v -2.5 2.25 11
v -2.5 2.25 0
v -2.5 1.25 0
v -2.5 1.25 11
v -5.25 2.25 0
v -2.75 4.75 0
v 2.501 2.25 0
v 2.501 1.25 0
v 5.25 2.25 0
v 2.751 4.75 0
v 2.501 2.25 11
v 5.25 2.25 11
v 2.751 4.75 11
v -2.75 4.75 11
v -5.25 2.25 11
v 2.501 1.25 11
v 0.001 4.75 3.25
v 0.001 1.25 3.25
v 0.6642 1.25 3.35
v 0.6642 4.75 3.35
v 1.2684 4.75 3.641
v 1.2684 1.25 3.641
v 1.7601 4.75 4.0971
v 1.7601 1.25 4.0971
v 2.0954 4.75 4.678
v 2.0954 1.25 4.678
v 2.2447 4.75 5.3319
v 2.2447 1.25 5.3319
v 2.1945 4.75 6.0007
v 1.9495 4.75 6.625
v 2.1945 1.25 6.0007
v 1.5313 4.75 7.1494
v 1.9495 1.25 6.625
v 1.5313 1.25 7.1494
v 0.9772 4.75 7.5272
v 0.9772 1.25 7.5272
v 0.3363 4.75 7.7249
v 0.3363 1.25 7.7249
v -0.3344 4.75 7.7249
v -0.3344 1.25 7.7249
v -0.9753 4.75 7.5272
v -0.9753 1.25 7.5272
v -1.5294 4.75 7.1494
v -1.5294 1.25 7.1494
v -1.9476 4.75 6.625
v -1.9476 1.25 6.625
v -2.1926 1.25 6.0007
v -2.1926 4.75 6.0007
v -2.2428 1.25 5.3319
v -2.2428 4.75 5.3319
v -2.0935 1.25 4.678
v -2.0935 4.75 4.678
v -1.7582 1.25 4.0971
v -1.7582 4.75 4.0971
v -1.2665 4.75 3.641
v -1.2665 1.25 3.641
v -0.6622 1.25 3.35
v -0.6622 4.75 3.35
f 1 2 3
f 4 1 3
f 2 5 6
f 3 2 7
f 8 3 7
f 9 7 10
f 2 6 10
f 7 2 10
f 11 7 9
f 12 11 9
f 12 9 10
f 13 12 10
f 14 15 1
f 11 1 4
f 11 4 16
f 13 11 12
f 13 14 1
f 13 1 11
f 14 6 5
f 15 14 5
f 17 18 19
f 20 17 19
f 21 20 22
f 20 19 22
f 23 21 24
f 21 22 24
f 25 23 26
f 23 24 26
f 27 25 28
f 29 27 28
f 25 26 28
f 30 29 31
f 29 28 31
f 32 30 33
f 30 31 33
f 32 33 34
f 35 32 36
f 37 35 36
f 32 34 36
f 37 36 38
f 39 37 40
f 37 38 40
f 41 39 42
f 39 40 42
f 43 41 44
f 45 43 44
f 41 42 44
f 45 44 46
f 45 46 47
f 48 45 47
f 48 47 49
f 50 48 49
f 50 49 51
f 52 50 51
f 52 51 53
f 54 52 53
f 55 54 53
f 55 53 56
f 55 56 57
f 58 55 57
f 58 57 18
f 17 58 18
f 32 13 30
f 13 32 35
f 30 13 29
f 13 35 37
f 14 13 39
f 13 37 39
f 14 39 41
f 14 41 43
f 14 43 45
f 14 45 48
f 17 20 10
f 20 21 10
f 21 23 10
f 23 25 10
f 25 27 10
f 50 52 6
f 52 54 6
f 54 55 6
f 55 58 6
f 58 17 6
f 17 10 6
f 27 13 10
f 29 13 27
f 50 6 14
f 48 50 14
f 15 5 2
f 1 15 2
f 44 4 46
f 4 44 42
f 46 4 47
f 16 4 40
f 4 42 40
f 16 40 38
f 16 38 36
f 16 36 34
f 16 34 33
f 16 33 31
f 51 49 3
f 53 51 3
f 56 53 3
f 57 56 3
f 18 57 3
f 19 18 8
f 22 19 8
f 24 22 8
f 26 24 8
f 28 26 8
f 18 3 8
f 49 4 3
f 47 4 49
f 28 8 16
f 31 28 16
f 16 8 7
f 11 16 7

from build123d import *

# Parameters (mm, degrees)
BOSS_EXTRU_1_DEPTH      = 11
ESQUISSE2_R             = 2.25
ENL_V_MAT_EXTRU_1_DEPTH = 13.681186853


with BuildPart() as part:
    # Esquisse1 → Boss.-Extru.1 (new body)
    with BuildSketch(Plane.XY):
        Polygon((2.500951888, 4.75), (-2.5, 4.75), (-2.75, 4.75), (-5.25, 2.25), (-4.5, 2.25), (-2.5, 2.25), (-2.5, 1.25), (2.500951888, 1.25), (2.500951888, 2.25), (4.5, 2.25), (5.25, 2.25), (2.750951888, 4.75), align=None)
    extrude(amount=BOSS_EXTRU_1_DEPTH)

    # Esquisse2 → Enlèv. mat.-Extru.1 (cut, through all)
    with BuildSketch(Plane.XZ.offset(-1.25)):
        with Locations(Location((0.000951888, 5.5, 0), (0, 0, 270))):
            Circle(ESQUISSE2_R)
    extrude(amount=-ENL_V_MAT_EXTRU_1_DEPTH, mode=Mode.SUBTRACT)


solid = part.part
